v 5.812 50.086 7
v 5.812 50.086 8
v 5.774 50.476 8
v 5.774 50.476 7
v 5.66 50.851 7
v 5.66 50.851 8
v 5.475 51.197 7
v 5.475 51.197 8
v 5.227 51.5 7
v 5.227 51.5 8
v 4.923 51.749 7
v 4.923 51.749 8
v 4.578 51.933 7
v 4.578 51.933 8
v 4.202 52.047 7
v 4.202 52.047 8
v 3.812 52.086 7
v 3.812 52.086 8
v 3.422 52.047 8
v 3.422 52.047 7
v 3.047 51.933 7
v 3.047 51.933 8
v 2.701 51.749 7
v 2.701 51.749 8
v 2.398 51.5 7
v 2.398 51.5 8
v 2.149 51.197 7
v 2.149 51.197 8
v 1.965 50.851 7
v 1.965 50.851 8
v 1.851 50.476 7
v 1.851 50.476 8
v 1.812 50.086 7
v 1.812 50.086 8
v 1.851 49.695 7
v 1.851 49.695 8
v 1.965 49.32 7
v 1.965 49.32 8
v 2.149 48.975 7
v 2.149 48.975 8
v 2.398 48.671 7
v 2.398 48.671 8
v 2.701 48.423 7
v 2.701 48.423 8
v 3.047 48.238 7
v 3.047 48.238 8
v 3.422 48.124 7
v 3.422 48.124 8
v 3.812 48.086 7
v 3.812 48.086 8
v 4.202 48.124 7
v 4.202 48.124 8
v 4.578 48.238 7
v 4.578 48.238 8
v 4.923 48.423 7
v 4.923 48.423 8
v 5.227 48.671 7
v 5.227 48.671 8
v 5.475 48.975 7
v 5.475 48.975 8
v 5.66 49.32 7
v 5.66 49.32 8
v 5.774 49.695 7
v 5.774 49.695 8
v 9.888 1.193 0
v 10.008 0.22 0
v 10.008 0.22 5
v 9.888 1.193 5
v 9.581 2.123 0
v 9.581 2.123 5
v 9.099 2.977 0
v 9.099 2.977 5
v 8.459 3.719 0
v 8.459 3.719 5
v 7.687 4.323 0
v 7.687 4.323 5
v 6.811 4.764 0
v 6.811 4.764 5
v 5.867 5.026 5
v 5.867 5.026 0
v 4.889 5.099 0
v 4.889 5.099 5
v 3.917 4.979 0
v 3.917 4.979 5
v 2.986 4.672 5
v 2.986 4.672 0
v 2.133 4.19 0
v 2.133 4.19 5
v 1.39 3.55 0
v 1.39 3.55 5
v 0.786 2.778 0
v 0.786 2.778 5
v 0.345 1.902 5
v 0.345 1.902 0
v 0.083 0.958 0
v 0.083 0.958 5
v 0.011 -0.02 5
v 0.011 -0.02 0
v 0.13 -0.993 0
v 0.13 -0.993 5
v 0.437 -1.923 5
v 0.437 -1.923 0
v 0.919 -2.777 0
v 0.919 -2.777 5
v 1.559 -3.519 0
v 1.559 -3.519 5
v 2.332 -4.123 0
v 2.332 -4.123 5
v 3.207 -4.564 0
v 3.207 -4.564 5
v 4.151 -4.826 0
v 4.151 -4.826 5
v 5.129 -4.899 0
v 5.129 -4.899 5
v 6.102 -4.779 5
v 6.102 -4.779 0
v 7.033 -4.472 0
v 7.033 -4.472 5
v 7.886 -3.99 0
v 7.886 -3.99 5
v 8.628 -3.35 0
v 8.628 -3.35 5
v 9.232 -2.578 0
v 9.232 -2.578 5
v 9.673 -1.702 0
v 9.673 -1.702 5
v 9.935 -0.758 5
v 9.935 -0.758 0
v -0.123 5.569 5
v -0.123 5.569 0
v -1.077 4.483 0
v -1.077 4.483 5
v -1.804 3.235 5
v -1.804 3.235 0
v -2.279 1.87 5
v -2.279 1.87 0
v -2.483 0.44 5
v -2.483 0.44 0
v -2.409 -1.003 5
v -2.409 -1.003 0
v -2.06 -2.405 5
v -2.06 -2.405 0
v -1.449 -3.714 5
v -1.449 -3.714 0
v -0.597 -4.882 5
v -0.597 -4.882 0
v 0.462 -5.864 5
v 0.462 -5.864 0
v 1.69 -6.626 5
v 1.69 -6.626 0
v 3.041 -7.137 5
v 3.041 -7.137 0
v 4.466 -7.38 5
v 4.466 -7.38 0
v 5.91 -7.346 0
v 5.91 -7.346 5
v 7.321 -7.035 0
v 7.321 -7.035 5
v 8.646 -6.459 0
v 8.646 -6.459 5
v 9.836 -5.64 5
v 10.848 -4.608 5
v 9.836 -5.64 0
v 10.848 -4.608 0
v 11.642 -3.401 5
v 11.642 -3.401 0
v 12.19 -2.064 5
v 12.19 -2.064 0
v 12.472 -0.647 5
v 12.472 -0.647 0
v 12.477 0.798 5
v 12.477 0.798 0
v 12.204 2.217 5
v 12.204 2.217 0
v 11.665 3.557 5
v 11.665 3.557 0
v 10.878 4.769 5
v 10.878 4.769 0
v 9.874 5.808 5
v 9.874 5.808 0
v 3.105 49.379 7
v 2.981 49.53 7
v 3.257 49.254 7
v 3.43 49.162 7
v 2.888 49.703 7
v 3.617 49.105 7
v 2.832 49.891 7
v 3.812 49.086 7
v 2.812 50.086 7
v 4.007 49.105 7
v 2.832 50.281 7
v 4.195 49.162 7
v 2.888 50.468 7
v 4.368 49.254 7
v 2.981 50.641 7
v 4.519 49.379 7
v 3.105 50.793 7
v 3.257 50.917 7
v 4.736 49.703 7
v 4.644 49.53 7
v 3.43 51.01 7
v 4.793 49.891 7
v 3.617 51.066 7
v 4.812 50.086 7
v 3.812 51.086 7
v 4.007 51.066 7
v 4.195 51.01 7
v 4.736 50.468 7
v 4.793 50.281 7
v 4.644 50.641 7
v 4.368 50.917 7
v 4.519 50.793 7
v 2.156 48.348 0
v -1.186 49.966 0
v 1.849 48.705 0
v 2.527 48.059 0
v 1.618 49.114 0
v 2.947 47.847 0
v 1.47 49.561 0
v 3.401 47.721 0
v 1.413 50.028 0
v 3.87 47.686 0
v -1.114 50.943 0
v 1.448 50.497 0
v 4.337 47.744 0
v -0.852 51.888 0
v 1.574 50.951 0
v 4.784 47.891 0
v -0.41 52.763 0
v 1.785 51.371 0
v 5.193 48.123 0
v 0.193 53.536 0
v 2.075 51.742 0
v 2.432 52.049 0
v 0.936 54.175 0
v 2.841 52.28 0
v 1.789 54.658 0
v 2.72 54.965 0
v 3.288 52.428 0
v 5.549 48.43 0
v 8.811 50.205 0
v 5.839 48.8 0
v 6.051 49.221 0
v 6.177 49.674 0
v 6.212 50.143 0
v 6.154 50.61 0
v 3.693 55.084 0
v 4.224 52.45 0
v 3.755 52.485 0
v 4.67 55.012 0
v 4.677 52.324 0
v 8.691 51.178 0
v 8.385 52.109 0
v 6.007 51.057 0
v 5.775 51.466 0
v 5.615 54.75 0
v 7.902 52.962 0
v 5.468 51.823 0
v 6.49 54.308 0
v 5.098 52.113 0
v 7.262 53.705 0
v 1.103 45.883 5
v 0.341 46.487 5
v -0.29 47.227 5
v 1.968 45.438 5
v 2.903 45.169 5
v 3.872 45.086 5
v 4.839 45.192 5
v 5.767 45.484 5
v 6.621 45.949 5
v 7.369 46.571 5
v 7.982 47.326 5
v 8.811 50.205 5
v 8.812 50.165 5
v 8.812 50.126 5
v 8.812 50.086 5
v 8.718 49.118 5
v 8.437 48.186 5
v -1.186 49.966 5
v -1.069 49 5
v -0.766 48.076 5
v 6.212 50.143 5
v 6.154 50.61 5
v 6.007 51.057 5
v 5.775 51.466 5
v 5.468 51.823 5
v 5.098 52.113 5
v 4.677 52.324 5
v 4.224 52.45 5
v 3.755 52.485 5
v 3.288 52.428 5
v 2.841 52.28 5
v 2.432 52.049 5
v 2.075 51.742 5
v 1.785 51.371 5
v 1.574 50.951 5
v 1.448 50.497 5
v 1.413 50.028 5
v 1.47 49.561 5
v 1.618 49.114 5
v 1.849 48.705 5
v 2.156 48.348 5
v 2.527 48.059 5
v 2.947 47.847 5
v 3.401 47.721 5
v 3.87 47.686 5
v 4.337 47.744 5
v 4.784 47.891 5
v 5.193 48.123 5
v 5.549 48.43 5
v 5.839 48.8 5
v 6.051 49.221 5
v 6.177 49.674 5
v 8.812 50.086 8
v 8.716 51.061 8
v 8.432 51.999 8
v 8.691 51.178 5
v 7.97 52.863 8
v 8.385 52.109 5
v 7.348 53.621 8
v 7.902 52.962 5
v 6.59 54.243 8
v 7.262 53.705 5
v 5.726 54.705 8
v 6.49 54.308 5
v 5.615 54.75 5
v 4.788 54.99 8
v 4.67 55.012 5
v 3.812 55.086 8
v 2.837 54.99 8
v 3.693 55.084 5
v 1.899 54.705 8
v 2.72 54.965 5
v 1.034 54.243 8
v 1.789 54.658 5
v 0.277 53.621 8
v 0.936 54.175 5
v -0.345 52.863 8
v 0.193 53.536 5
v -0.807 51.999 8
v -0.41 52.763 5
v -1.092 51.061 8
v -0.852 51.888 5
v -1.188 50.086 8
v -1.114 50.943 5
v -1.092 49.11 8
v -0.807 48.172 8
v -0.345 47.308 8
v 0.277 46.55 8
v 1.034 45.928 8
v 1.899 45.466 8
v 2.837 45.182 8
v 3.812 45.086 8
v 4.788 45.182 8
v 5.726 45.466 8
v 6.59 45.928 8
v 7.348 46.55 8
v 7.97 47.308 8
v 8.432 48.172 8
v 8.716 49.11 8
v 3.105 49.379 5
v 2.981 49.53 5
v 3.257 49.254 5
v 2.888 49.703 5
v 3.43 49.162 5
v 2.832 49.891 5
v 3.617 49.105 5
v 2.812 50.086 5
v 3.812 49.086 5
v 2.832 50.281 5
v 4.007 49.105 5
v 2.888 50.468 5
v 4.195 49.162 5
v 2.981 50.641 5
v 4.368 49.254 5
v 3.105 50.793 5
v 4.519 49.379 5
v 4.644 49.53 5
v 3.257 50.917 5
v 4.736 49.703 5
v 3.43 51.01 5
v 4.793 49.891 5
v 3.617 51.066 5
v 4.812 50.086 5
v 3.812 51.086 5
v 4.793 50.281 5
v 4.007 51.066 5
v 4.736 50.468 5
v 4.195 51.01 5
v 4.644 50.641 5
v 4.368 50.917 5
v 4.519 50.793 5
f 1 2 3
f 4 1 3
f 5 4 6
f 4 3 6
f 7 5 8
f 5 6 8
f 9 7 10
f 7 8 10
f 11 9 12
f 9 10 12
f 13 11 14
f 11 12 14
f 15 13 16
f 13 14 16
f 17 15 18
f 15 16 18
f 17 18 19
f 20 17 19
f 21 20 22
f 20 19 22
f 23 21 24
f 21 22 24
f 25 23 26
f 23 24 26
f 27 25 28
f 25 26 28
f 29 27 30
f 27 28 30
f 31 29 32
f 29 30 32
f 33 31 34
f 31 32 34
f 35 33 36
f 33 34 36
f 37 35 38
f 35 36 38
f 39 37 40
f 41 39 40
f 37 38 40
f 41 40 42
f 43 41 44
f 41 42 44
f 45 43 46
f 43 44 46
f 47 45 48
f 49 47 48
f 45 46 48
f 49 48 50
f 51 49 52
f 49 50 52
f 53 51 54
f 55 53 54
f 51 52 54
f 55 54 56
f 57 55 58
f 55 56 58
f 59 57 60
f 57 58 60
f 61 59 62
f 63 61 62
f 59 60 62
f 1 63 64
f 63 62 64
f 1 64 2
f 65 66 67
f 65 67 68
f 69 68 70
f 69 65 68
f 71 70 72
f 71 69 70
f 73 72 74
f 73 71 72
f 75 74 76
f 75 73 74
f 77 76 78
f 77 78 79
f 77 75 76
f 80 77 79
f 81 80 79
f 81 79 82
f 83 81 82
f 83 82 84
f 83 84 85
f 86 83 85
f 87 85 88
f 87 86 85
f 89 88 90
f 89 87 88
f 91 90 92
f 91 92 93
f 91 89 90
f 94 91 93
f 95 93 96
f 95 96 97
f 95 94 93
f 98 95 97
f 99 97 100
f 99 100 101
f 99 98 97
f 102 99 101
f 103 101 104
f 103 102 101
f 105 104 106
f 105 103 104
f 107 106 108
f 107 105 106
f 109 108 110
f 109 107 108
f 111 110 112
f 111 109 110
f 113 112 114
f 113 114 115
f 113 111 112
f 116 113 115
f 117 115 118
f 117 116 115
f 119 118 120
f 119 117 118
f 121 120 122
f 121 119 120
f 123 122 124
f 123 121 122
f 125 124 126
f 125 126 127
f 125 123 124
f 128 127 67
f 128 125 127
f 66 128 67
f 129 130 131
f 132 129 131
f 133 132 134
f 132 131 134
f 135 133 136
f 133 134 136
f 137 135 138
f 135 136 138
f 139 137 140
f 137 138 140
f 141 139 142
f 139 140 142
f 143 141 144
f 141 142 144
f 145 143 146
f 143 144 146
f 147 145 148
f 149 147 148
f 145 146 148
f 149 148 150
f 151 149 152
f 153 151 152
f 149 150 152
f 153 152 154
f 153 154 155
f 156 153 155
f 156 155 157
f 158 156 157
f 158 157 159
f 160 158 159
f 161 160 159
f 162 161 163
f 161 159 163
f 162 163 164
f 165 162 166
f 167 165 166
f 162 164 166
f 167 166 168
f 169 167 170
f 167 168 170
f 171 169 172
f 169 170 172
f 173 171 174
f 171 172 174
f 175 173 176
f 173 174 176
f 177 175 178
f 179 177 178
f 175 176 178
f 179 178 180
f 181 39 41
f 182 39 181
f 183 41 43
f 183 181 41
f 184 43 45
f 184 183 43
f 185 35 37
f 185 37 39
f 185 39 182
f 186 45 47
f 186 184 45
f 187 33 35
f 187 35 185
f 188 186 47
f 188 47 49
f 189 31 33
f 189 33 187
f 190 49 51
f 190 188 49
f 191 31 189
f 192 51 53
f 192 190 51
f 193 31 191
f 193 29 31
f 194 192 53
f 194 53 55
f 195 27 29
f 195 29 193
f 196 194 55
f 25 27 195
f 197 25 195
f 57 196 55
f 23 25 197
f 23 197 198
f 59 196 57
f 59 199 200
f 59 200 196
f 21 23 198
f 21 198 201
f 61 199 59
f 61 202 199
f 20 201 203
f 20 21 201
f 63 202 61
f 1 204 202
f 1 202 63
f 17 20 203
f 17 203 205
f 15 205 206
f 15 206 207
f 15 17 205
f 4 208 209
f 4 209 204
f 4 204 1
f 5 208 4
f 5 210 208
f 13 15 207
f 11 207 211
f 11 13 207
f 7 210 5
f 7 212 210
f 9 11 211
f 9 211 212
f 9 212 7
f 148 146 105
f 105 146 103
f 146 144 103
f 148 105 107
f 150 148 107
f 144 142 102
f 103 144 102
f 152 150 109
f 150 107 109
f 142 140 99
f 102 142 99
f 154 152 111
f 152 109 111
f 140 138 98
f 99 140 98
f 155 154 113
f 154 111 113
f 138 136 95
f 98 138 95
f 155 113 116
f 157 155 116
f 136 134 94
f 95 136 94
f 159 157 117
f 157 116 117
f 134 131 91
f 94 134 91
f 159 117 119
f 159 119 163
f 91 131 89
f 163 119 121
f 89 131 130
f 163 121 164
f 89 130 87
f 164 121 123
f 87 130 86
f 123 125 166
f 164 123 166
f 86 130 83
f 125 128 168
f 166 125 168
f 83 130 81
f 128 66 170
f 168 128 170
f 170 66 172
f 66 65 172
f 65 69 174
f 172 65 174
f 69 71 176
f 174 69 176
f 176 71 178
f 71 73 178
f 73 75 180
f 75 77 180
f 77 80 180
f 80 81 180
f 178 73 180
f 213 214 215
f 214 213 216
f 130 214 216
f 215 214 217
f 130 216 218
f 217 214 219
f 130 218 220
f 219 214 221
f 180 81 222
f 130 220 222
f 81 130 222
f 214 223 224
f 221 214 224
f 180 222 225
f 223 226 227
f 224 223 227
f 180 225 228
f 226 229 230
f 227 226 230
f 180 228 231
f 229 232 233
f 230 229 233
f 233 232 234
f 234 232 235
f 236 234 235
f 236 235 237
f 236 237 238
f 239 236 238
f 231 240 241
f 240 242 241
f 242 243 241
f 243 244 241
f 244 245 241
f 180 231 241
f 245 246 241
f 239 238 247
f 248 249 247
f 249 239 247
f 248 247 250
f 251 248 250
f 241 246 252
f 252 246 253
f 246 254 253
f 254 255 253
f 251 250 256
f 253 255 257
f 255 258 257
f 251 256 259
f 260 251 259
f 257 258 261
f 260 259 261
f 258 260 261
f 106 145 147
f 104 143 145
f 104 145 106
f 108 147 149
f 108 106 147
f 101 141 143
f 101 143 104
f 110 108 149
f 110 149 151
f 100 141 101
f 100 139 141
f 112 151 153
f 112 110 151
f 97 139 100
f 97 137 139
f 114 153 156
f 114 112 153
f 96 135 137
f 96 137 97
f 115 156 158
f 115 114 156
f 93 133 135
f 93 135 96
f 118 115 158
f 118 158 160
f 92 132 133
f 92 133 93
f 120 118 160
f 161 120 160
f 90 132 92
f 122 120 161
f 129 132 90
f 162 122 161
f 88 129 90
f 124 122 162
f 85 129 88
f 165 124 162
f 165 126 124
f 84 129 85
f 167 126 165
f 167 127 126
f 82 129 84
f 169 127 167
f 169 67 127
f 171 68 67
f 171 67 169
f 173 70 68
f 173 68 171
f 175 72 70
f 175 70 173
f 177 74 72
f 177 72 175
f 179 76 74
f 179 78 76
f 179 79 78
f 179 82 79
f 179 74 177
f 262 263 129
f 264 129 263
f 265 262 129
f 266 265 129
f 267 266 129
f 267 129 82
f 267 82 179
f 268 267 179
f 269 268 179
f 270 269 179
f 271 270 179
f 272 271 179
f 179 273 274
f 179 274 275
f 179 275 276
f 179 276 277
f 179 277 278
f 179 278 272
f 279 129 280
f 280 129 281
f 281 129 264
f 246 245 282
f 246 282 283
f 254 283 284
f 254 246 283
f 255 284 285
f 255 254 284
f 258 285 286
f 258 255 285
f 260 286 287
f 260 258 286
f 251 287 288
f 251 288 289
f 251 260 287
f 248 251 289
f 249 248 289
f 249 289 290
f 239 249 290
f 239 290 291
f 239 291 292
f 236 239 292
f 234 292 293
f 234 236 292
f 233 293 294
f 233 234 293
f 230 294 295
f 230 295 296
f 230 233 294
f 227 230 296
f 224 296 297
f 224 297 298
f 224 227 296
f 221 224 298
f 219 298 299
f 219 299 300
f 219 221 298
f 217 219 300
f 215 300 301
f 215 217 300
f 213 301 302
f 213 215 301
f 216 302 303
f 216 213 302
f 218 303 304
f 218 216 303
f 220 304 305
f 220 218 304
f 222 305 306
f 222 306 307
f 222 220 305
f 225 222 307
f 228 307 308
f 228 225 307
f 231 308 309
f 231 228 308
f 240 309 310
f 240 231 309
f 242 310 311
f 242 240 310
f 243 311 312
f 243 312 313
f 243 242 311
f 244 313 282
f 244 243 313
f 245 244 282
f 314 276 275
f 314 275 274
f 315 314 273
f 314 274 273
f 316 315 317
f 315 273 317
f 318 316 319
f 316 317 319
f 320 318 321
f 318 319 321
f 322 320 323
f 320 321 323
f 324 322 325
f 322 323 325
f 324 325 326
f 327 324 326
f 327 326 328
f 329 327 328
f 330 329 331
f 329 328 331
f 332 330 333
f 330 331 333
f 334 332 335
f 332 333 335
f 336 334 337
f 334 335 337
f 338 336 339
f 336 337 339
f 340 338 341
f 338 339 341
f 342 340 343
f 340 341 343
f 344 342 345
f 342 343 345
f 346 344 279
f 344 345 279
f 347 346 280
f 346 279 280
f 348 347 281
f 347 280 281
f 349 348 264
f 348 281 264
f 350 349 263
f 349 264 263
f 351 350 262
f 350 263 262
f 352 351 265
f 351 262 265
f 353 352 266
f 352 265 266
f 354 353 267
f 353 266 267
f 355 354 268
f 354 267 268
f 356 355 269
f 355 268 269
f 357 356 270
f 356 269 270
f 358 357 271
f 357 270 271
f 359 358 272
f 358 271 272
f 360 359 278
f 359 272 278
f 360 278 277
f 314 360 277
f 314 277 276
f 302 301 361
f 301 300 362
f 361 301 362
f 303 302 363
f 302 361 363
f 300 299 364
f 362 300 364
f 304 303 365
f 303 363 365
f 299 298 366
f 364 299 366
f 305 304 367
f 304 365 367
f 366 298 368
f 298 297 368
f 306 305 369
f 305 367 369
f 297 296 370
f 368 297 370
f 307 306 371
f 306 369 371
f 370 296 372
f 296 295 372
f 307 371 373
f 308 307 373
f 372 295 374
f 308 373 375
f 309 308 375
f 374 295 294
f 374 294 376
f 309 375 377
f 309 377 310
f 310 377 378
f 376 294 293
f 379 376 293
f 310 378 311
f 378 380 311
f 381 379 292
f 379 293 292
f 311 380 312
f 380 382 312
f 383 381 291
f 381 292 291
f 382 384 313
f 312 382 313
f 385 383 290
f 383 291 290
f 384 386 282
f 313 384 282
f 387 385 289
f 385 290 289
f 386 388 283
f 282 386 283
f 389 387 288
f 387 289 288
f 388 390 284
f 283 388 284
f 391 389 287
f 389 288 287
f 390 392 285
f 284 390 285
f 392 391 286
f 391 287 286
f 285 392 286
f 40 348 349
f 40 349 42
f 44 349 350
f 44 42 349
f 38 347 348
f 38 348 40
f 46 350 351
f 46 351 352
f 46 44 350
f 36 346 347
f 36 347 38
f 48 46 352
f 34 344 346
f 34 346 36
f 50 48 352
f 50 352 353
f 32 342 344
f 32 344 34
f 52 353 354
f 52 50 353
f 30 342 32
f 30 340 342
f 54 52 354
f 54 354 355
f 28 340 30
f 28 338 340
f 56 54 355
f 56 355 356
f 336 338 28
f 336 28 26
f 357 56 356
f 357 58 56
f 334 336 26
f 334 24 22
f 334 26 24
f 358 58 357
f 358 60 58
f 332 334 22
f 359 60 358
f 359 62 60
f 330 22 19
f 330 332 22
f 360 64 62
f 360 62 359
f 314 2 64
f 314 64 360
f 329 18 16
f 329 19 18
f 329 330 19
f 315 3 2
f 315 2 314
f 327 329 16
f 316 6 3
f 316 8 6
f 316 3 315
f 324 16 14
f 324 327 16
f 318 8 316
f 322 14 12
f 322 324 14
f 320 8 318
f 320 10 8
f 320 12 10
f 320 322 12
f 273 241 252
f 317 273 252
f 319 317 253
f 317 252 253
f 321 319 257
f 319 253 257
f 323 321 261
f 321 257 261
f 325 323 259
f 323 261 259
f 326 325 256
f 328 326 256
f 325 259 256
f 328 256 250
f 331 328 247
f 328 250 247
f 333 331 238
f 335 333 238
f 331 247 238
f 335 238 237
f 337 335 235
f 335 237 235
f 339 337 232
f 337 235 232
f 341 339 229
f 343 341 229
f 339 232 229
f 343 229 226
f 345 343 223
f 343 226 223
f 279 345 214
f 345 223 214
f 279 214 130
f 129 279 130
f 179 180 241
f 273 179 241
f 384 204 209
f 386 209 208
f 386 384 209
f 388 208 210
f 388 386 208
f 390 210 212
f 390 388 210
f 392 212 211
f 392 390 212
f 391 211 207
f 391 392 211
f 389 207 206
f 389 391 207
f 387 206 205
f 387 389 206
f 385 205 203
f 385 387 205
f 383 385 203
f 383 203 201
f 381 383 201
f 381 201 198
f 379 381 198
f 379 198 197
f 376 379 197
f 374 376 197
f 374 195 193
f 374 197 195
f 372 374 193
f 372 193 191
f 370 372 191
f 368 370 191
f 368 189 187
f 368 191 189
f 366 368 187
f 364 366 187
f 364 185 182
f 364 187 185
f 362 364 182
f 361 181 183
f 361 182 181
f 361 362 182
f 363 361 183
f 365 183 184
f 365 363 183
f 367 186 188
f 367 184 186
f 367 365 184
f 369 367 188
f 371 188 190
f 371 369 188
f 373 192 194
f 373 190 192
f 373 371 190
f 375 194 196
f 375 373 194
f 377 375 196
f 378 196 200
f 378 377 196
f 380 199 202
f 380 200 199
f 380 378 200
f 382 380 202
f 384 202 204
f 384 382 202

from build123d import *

# Parameters (mm, degrees)
SKETCH1_R           = 2.4
SKETCH1_R_2         = 5
BOSS_EXTRUDE1_DEPTH = 5
SKETCH2_R           = 5
SKETCH2_R_2         = 1
BOSS_EXTRUDE2_DEPTH = 3
SKETCH3_R           = 2
CUT_EXTRUDE1_DEPTH  = 1


with BuildPart() as part:
    # Sketch1 → Boss-Extrude1 (new body)
    with BuildSketch(Plane(origin=(0, 0, 0), x_dir=(0.999713496, 0.023935854, 0), z_dir=(0, 0, 1))):
        with BuildLine():
            Line((10.010039278, 5.570210903), (10.010039278, 49.980040959))
            ThreePointArc((10.010039278, 49.980040959), (5.010039278, 54.980040959), (0.010039278, 49.980040959))
            Line((0.010039278, 49.980040959), (0.010039278, 5.570210903))
            ThreePointArc((0.010039278, 5.570210903), (5.010039278, -7.519959041), (10.010039278, 5.570210903))
        make_face()
        with Locations((5.010039278, 49.980040959)):
            Circle(SKETCH1_R, mode=Mode.SUBTRACT)
        with Locations((5.010039278, -0.019959041)):
            Circle(SKETCH1_R_2, mode=Mode.SUBTRACT)
    extrude(amount=BOSS_EXTRUDE1_DEPTH)

    # Sketch2 → Boss-Extrude2 (add)
    with BuildSketch(Plane.XY.offset(5)):
        with Locations((3.812288906, 50.085641068)):
            Circle(SKETCH2_R)
        with Locations((3.812288906, 50.085641068)):
            Circle(SKETCH2_R_2, mode=Mode.SUBTRACT)
    extrude(amount=BOSS_EXTRUDE2_DEPTH)

    # Sketch3 → Cut-Extrude1 (cut)
    with BuildSketch(Plane.XY.offset(8)):
        with Locations((3.812288906, 50.085641068)):
            Circle(SKETCH3_R)
    extrude(amount=-CUT_EXTRUDE1_DEPTH, mode=Mode.SUBTRACT)


solid = part.part
